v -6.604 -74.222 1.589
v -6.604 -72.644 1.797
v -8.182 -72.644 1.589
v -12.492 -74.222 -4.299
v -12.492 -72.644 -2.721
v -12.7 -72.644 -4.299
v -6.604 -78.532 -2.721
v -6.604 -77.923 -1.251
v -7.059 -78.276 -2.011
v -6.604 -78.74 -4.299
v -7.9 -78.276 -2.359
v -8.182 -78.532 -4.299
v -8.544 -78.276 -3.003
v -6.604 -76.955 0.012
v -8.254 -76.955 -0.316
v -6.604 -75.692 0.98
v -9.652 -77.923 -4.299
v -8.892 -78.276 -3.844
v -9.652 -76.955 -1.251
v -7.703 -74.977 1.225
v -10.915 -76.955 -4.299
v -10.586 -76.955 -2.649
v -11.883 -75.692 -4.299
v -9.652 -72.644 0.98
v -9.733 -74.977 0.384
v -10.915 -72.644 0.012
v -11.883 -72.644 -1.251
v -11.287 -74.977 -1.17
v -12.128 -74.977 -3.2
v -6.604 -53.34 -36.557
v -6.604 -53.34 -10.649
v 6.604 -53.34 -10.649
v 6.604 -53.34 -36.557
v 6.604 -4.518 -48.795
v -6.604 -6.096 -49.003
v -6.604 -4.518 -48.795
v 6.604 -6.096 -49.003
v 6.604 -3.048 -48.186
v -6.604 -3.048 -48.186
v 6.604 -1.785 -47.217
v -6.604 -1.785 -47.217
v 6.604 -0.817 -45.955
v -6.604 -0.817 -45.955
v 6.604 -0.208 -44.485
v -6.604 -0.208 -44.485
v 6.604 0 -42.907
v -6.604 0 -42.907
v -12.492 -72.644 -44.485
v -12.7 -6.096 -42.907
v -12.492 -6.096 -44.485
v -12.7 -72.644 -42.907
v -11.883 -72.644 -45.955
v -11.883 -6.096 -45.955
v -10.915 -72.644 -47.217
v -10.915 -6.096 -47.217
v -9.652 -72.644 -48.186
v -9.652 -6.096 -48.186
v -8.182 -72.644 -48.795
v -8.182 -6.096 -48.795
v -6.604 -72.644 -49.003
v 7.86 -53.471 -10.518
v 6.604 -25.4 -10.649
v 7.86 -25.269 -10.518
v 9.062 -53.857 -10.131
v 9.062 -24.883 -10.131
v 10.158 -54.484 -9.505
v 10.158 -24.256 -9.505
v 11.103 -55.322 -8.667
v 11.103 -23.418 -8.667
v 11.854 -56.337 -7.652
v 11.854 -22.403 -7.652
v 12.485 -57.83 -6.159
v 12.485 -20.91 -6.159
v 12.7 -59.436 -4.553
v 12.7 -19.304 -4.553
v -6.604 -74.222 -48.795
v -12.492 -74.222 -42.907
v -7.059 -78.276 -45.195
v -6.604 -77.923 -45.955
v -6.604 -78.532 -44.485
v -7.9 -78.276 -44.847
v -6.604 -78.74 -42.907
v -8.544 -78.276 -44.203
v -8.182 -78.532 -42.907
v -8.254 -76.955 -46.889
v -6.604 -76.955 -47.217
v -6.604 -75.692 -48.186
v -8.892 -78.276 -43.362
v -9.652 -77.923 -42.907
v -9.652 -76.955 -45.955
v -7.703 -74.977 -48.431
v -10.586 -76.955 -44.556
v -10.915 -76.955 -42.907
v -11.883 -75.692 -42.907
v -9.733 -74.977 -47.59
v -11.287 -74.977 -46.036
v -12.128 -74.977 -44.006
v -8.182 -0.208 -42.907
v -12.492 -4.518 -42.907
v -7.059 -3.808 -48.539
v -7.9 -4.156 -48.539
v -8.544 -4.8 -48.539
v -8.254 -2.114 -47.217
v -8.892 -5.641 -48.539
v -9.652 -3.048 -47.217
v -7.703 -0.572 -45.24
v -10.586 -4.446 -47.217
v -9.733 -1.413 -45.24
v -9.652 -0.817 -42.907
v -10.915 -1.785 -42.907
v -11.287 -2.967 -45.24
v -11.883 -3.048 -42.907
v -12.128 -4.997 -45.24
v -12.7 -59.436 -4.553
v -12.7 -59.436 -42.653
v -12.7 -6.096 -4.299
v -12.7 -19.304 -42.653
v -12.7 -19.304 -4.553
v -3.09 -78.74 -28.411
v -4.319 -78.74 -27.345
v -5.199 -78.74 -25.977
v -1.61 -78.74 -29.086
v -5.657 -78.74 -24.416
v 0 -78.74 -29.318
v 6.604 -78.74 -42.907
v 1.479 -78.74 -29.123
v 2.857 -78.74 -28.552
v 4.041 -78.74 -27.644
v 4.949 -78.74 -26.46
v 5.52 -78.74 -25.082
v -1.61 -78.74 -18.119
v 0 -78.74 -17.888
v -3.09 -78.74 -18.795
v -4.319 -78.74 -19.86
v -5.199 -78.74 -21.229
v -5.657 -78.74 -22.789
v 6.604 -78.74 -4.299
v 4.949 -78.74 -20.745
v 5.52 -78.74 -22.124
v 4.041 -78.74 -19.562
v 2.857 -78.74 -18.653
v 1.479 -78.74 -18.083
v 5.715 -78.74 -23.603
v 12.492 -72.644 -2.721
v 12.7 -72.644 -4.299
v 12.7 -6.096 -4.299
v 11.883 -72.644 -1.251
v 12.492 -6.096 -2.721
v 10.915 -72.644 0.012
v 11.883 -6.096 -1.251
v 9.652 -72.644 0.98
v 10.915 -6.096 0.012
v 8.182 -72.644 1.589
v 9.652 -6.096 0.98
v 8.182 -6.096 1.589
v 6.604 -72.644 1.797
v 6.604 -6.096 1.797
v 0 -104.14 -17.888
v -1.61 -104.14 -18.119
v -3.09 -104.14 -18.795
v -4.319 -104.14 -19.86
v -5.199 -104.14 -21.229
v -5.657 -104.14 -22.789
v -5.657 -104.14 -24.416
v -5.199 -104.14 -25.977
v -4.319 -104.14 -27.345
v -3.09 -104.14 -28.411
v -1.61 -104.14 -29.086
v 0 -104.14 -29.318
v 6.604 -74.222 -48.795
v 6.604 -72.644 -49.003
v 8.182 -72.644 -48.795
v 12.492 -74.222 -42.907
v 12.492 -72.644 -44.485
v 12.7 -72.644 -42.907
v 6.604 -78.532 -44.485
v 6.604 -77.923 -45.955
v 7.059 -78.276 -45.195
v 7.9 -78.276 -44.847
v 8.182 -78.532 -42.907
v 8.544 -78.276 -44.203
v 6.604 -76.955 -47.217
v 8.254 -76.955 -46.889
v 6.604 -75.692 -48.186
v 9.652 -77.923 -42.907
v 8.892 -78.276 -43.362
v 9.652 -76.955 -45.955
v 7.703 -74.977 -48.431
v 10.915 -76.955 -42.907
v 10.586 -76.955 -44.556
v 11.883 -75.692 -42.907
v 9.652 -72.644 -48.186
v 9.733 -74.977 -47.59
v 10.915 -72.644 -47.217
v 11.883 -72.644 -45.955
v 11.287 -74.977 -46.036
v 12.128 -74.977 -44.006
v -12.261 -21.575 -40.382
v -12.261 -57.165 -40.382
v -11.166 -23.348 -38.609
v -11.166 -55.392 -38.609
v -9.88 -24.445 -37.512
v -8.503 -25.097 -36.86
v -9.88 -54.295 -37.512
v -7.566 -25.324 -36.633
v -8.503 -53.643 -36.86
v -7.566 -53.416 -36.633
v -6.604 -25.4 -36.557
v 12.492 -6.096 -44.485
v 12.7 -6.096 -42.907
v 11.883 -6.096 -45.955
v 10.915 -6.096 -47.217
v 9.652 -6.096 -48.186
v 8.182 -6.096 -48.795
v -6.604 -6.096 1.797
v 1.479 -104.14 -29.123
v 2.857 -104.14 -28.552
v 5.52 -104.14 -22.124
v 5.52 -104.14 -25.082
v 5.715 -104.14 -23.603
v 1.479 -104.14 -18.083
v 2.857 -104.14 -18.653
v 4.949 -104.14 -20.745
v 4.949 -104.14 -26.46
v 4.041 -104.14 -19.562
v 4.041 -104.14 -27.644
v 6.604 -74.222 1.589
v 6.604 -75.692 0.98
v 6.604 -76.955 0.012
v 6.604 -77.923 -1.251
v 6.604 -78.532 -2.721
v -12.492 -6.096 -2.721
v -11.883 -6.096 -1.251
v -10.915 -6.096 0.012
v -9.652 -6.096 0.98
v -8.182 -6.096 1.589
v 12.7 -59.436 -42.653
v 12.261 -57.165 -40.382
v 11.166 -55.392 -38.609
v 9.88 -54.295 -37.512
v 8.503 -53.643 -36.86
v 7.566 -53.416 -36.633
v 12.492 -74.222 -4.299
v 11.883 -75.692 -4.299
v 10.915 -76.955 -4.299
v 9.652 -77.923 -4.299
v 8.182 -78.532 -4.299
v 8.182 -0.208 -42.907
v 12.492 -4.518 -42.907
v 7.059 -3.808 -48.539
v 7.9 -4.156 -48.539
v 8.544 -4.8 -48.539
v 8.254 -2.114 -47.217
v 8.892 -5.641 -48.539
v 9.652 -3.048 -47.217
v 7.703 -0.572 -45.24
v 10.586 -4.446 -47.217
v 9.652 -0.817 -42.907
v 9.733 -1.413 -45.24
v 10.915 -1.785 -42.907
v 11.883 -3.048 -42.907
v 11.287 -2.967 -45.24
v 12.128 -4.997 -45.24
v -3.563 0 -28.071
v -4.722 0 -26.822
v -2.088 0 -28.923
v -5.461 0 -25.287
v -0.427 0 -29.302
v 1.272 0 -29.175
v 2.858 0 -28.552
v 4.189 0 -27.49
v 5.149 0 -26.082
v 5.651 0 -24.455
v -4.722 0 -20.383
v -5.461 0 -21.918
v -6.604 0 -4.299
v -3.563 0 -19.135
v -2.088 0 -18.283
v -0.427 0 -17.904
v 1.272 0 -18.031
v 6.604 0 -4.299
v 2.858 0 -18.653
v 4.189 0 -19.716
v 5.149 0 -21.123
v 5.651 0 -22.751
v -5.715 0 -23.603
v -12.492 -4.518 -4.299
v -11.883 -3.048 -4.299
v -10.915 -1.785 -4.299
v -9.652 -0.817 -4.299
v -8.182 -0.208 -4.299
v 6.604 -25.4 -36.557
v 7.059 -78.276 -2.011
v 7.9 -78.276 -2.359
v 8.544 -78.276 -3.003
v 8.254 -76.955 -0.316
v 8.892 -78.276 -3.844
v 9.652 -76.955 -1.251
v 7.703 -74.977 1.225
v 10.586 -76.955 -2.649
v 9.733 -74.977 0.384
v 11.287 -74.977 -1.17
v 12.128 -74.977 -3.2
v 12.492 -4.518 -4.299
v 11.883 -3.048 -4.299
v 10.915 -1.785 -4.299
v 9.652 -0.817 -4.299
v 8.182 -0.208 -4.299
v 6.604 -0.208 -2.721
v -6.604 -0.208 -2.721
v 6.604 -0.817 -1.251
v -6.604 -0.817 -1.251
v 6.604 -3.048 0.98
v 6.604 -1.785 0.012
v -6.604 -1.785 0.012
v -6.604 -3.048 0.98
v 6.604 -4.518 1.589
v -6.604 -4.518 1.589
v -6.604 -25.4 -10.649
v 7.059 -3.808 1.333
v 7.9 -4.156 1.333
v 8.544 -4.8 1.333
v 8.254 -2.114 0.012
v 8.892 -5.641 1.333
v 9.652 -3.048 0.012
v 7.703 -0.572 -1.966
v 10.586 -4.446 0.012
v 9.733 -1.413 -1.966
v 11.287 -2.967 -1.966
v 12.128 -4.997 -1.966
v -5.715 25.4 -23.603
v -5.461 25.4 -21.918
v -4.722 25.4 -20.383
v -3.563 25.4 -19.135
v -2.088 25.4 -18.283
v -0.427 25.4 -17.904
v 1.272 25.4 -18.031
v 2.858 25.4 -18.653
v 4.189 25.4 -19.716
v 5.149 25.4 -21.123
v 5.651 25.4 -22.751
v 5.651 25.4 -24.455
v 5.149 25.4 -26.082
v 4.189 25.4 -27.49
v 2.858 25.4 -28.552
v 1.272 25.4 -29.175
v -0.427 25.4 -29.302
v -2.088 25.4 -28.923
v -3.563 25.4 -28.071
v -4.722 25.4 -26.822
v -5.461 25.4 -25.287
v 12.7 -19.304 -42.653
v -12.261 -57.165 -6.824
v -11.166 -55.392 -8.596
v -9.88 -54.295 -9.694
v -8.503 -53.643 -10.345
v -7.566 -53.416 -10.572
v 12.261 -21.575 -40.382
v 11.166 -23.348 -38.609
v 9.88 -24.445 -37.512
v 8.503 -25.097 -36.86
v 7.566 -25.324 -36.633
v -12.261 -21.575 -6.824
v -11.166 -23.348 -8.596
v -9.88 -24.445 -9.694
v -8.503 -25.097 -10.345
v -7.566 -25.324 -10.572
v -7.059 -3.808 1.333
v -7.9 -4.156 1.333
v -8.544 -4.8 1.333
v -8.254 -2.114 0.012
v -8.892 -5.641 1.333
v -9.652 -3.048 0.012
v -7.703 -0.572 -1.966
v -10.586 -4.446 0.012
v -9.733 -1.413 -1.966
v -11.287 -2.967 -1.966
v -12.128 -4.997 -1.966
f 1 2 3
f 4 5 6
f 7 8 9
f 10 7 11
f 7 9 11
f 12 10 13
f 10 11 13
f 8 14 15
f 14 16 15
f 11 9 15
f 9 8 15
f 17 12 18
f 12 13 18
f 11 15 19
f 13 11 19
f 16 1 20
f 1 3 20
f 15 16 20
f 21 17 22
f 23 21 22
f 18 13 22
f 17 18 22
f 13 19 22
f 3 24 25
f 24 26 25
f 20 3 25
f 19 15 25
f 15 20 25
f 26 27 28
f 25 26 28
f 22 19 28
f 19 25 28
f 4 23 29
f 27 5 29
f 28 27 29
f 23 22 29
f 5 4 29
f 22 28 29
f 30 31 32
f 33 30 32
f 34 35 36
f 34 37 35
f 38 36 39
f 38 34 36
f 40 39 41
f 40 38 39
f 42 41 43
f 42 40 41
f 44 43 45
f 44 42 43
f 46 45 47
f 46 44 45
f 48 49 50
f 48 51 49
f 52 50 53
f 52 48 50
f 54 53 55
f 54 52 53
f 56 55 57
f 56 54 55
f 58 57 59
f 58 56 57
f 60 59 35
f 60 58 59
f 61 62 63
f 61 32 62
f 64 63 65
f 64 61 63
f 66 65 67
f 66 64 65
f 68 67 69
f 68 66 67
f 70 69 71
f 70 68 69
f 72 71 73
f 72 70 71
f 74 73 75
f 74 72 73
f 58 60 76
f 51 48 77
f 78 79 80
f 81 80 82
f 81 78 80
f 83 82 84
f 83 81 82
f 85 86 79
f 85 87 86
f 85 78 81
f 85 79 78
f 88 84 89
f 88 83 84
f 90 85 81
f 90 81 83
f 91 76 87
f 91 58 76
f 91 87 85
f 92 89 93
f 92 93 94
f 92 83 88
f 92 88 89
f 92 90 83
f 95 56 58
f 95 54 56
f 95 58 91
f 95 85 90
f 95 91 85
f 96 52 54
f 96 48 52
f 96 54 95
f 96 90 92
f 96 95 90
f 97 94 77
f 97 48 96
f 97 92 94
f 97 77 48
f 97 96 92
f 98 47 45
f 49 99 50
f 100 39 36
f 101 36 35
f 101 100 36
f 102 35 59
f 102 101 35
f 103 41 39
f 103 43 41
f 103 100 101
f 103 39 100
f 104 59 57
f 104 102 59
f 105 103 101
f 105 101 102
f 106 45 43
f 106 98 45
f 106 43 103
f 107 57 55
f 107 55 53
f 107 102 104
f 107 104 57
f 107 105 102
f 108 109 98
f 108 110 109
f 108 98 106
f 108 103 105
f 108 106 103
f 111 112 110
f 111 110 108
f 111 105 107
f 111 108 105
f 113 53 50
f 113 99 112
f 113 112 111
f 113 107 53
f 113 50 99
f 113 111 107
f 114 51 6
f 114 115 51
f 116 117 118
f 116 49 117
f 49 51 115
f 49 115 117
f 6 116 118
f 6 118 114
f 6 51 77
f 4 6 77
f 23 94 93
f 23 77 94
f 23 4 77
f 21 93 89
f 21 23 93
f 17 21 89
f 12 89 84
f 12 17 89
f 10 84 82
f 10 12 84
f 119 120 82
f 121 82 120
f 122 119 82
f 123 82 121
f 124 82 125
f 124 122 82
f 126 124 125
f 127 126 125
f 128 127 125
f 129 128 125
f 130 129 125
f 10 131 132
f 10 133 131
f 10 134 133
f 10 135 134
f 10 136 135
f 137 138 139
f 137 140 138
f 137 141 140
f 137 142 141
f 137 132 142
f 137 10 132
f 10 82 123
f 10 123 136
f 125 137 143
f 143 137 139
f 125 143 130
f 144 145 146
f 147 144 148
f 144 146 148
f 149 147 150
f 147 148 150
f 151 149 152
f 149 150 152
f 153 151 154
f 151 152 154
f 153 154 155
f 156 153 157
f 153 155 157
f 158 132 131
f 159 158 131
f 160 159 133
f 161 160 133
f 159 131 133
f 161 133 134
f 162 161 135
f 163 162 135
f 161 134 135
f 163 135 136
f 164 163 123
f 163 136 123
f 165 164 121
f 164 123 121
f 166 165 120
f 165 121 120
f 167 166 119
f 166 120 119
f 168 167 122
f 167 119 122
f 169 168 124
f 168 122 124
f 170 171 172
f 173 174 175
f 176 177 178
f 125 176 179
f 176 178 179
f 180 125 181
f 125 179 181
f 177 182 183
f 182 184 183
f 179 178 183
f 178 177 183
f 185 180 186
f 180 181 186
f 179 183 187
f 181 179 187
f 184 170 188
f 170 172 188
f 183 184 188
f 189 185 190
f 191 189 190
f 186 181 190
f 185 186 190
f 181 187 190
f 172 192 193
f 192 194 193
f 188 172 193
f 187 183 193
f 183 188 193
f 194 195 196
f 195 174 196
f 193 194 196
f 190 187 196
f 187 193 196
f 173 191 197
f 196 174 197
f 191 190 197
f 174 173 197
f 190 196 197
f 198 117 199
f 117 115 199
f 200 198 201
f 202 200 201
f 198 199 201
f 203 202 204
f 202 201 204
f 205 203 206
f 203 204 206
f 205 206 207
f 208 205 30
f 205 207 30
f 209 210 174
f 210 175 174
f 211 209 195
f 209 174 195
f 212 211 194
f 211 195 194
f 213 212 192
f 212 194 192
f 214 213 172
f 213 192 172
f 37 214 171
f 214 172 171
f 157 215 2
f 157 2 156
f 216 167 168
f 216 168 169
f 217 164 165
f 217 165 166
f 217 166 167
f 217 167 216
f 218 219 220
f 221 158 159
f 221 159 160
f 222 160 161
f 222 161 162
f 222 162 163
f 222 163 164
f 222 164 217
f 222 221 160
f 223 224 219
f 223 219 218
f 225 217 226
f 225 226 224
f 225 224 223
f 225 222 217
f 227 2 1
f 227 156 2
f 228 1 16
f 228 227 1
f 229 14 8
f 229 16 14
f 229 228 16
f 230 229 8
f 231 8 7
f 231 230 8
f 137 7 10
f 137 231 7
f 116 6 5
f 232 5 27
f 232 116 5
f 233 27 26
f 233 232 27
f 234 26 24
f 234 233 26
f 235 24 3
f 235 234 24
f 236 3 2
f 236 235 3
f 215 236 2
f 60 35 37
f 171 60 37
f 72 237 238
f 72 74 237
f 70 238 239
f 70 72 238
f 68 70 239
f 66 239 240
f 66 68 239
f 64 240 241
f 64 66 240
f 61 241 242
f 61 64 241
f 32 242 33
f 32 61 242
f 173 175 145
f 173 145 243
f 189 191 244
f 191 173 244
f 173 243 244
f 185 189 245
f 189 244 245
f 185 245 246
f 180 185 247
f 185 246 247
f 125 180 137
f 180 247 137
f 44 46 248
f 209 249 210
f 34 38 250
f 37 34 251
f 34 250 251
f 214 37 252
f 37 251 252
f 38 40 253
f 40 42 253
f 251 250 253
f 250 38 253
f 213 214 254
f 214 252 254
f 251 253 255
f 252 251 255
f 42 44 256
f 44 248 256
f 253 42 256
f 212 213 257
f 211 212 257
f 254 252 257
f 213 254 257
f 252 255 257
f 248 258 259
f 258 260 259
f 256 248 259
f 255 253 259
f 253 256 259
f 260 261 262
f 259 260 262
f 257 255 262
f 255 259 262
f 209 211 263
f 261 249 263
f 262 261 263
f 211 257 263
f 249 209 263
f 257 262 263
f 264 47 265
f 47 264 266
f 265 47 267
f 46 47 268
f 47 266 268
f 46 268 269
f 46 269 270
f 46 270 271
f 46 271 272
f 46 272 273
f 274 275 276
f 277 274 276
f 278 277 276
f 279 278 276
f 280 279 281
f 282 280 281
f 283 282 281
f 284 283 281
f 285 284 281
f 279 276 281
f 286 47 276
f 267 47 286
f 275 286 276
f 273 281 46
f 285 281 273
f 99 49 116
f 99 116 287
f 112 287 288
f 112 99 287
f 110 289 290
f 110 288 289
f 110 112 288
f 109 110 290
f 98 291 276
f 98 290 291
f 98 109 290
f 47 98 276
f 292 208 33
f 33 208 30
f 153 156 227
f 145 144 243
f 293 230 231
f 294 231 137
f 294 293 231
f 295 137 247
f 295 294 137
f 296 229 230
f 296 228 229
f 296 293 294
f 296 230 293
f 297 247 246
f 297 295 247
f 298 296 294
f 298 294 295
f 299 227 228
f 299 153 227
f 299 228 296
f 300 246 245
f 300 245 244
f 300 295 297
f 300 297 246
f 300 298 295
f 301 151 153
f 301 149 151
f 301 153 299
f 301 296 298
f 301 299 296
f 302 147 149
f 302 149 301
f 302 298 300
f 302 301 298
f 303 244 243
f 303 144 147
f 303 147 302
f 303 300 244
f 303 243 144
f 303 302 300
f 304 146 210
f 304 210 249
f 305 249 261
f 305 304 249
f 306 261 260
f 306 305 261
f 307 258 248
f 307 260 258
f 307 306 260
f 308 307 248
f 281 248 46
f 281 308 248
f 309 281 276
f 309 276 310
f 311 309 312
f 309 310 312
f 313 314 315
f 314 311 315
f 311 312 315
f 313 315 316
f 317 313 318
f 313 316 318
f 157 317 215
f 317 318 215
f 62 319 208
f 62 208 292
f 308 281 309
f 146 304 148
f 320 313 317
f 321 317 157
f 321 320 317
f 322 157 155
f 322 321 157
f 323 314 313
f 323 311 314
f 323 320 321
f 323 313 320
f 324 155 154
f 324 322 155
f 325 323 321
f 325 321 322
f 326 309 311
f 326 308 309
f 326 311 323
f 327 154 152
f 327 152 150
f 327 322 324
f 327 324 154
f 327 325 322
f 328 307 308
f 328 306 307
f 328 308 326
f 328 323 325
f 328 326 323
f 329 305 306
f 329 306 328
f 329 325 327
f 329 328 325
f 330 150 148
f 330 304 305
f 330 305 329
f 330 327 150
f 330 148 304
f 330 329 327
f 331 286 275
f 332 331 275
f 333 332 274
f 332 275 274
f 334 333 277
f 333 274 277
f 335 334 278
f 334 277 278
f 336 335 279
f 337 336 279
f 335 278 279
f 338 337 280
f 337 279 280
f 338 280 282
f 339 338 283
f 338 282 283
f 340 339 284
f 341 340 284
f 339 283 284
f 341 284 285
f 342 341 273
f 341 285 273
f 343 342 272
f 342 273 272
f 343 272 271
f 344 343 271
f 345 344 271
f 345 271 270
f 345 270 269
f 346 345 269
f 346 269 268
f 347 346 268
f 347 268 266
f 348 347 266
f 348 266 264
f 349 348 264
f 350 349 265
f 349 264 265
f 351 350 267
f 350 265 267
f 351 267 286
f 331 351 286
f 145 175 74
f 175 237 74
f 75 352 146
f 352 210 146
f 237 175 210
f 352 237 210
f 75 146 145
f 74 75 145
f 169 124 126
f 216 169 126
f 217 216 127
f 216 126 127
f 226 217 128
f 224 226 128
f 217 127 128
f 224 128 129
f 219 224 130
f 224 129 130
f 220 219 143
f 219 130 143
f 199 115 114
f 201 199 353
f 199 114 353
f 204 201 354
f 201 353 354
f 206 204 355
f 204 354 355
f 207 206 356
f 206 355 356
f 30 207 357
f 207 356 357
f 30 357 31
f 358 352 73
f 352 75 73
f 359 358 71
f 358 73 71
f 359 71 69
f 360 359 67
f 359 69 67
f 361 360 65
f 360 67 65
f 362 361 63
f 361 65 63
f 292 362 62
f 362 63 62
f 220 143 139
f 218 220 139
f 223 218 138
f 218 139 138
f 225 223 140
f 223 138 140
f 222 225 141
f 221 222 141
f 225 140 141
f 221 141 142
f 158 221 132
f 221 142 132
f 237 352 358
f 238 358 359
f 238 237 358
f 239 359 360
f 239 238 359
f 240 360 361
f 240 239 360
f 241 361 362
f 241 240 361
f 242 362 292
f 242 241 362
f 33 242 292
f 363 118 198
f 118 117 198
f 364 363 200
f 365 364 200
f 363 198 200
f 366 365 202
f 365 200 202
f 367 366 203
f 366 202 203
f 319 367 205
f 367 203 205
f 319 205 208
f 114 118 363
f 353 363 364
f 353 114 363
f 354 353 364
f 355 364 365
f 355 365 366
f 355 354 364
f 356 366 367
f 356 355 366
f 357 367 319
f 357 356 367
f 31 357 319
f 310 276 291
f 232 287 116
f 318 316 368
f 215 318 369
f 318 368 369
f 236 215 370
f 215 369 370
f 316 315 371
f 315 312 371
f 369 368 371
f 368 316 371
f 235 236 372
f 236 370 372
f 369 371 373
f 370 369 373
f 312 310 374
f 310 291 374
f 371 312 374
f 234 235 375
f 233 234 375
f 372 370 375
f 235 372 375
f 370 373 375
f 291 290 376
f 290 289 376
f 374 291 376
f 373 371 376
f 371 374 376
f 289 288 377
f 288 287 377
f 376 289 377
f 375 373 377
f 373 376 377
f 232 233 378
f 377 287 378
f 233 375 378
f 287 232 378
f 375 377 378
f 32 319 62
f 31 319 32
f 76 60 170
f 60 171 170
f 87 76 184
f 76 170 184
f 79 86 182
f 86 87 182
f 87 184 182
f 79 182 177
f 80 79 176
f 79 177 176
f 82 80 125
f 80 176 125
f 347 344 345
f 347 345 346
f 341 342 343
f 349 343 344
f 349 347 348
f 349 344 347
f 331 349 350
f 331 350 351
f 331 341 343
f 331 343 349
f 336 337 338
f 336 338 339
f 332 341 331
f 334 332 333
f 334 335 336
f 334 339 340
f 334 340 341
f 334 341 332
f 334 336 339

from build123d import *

# Parameters (mm, degrees)
F1_DEPTH  = 25.4
F2_W      = 27.94
F2_H      = 12.446
F3_DEPTH  = 25.4
F4_R      = 5.715
F5_DEPTH  = 25.4
F6_W      = 25.4
F6_H      = 50.8
F7_DEPTH  = 25.4
F8_R      = 6.096
F10_DEPTH = 25.4


with BuildPart() as f1:
    # F0 (on Front) → F1 (new body)
    with BuildSketch(Plane.XZ):
        Polygon((-12.7, -49.002826), (0, -49.002826), (12.7, -49.002826), (12.7, 1.797174), (-12.7, 1.797174), align=None)
    extrude(amount=F1_DEPTH)

    # F2 (on face) → F3 (join)
    with BuildSketch(Plane(origin=(-12.7, 0, 0), x_dir=(0, -1, 0), z_dir=(-1, 0, 0))):
        with Locations((39.37, -4.425826)):
            Rectangle(F2_W, F2_H)
        with Locations((39.37, -42.779826)):
            Rectangle(F2_W, F2_H)
    extrude(amount=-F3_DEPTH)

    # F4 (on face) → F5 (join)
    with BuildSketch(Plane(origin=(0, 0, 0), x_dir=(-1, 0, 0), z_dir=(0, 1, 0))):
        with Locations((0, -23.602826)):
            Circle(F4_R)
    extrude(amount=F5_DEPTH)

    # F6 (on face) → F7 (join)
    with BuildSketch(Plane.XZ.offset(53.34)):
        with Locations((0, -23.602826)):
            Rectangle(F6_W, F6_H)
    extrude(amount=F7_DEPTH)

    # F8
    f8_edges = [f1.edges().sort_by_distance(p)[0] for p in [
        (-12.7, 0, -23.602826),
        (12.7, 0, -23.602826),
        (0, 0, 1.797174),
        (0, 0, -49.002826),
        (-12.7, -39.37, -36.556826),
        (-12.7, -39.37, -10.648826),
        (12.7, -39.37, -36.556826),
        (12.7, -39.37, -10.648826),
        (-12.7, -39.37, 1.797174),
        (12.7, -39.37, 1.797174),
        (12.7, -39.37, -49.002826),
        (-12.7, -39.37, -49.002826),
        (-12.7, -25.4, -23.602826),
        (12.7, -25.4, -23.602826),
        (0, -78.74, 1.797174),
        (0, -78.74, -49.002826),
        (-12.7, -78.74, -23.602826),
        (12.7, -78.74, -23.602826),
        (-12.7, -53.34, -23.602826),
        (12.7, -53.34, -23.602826),
    ]]
    fillet(f8_edges, radius=F8_R)

    # F9 (on face) → F10 (join)
    with BuildSketch(Plane.XZ.offset(78.74)):
        with BuildLine():
            ThreePointArc((5.715, -23.602826), (4.041115, -19.561711), (0, -17.887826))
            Line((0, -17.887826), (0, -23.602826))
            Line((0, -23.602826), (0, -29.317826))
            ThreePointArc((0, -29.317826), (4.041115, -27.643941), (5.715, -23.602826))
        make_face()
        with BuildLine():
            Line((0, -23.602826), (0, -17.887826))
            ThreePointArc((0, -17.887826), (-5.715, -23.602826), (0, -29.317826))
            Line((0, -29.317826), (0, -23.602826))
        make_face()
    extrude(amount=F10_DEPTH)


solid = f1.part
